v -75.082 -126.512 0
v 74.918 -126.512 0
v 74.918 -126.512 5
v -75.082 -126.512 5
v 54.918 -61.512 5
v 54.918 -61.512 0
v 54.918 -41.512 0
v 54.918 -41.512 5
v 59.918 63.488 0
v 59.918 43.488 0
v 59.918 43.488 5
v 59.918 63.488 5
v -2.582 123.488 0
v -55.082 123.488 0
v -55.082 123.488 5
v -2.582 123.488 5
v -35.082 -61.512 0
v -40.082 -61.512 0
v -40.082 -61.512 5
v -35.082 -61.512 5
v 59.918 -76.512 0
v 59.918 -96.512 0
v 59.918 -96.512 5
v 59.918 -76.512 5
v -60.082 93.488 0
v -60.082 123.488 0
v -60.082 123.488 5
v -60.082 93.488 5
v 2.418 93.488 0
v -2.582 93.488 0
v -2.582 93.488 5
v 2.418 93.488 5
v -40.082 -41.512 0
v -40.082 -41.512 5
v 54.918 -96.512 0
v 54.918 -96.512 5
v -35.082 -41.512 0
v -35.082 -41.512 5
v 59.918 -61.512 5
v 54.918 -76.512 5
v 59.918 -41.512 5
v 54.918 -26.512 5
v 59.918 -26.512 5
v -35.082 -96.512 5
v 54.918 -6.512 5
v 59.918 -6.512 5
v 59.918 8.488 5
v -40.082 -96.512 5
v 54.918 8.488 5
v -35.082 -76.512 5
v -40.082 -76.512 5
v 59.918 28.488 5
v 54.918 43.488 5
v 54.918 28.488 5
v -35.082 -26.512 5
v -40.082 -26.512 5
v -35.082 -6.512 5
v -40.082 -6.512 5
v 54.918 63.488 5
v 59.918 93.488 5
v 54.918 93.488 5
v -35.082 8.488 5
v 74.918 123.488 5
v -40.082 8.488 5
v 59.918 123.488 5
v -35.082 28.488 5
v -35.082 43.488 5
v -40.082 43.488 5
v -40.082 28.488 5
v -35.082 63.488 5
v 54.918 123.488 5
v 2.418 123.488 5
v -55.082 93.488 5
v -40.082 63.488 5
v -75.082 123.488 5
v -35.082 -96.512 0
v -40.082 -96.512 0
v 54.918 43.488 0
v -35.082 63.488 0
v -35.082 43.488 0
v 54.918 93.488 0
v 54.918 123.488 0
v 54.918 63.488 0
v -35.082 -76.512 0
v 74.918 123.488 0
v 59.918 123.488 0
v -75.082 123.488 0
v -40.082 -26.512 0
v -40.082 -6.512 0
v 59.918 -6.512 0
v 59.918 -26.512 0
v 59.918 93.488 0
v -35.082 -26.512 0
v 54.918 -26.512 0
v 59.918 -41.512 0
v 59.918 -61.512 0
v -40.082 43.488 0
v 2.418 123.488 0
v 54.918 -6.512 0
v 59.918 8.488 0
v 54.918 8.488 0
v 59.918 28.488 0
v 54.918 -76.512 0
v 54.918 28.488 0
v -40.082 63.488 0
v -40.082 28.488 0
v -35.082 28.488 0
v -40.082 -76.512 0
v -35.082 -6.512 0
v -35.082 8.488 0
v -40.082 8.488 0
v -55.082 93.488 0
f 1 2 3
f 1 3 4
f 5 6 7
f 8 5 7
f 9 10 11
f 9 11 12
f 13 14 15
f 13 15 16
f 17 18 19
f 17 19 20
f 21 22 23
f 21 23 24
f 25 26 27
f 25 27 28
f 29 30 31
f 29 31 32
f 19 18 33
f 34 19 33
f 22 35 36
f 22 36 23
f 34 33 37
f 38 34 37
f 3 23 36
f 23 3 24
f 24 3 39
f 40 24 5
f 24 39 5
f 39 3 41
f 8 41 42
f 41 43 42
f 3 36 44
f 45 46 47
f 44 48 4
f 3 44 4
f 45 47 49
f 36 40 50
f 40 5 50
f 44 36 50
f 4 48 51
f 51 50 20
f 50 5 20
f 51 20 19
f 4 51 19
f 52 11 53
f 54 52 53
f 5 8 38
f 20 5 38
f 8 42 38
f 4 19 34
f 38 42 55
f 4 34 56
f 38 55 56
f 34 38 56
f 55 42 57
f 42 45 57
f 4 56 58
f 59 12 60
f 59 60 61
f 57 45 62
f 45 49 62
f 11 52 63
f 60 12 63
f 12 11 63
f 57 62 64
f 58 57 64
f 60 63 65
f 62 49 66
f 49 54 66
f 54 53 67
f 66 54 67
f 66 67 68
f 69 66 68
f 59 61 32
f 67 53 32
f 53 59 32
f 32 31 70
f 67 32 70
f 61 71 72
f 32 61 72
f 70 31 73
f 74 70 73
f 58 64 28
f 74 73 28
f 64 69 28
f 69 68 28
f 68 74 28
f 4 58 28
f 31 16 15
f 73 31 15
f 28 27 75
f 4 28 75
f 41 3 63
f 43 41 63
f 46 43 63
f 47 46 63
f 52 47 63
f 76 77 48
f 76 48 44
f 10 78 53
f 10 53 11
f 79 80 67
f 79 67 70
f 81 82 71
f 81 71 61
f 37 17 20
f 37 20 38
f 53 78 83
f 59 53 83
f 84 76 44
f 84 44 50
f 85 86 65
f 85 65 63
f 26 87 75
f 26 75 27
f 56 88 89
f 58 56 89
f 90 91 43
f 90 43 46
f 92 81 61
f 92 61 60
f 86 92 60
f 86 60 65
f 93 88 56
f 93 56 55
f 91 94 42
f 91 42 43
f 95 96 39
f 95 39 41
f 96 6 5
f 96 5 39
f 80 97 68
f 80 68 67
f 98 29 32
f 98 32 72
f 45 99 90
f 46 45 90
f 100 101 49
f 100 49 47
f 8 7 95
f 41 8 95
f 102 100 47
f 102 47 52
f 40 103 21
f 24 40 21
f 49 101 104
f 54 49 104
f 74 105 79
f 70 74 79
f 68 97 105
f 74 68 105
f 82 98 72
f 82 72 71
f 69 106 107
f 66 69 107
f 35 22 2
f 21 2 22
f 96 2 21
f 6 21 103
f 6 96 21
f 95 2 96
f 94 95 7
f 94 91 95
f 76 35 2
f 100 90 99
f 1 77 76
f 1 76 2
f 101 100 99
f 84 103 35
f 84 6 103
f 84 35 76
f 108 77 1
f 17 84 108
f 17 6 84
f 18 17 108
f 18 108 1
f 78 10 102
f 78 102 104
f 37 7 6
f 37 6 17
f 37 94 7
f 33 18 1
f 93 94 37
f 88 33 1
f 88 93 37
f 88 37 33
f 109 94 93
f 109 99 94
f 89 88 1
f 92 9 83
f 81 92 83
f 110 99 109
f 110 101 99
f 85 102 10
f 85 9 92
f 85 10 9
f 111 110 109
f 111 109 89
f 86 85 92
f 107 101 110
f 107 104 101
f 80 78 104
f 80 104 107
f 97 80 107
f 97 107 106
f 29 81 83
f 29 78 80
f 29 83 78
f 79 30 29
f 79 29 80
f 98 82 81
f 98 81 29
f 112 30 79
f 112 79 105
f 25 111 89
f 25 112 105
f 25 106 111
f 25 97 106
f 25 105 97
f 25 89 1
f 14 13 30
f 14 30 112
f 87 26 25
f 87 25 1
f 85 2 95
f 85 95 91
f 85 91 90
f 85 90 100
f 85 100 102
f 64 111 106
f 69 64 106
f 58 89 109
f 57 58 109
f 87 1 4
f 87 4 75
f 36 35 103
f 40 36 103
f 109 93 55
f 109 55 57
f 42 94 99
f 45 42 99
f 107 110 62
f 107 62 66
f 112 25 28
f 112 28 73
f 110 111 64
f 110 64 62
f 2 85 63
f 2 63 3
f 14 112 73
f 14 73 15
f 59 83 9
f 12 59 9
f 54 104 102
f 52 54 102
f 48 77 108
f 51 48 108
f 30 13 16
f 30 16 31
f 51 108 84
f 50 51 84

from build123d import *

# Parameters (mm, degrees)
SKETCH_W  = 5
SKETCH_H  = 20
PAD_DEPTH = 5


with BuildPart() as part:
    # Sketch → Pad (new body)
    with BuildSketch(Plane.XY):
        Polygon((74.918265, 123.488459), (74.918265, -126.511541), (-75.081735, -126.511541), (-75.081735, 123.488459), (-60.081735, 123.488459), (-60.081735, 93.488459), (-55.081735, 93.488459), (-55.081735, 123.488459), (-2.581735, 123.488459), (-2.581735, 93.488459), (2.418265, 93.488459), (2.418265, 123.488459), (54.918265, 123.488459), (54.918265, 93.488459), (59.918265, 93.488459), (59.918265, 123.488459), align=None)
        with Locations((-37.581735, -16.511541)):
            Rectangle(SKETCH_W, SKETCH_H, mode=Mode.SUBTRACT)
        with Locations((-37.581735, 18.488459)):
            Rectangle(SKETCH_W, SKETCH_H, mode=Mode.SUBTRACT)
        with Locations((-37.581735, 53.488459)):
            Rectangle(SKETCH_W, SKETCH_H, mode=Mode.SUBTRACT)
        with Locations((-37.581735, -51.511541)):
            Rectangle(SKETCH_W, SKETCH_H, mode=Mode.SUBTRACT)
        with Locations((-37.581735, -86.511541)):
            Rectangle(SKETCH_W, SKETCH_H, mode=Mode.SUBTRACT)
        with Locations((57.418265, -16.511541)):
            Rectangle(SKETCH_W, SKETCH_H, mode=Mode.SUBTRACT)
        with Locations((57.418265, -51.511541)):
            Rectangle(SKETCH_W, SKETCH_H, mode=Mode.SUBTRACT)
        with Locations((57.418265, -86.511541)):
            Rectangle(SKETCH_W, SKETCH_H, mode=Mode.SUBTRACT)
        with Locations((57.418265, 18.488459)):
            Rectangle(SKETCH_W, SKETCH_H, mode=Mode.SUBTRACT)
        with Locations((57.418265, 53.488459)):
            Rectangle(SKETCH_W, SKETCH_H, mode=Mode.SUBTRACT)
    extrude(amount=PAD_DEPTH)


solid = part.part
